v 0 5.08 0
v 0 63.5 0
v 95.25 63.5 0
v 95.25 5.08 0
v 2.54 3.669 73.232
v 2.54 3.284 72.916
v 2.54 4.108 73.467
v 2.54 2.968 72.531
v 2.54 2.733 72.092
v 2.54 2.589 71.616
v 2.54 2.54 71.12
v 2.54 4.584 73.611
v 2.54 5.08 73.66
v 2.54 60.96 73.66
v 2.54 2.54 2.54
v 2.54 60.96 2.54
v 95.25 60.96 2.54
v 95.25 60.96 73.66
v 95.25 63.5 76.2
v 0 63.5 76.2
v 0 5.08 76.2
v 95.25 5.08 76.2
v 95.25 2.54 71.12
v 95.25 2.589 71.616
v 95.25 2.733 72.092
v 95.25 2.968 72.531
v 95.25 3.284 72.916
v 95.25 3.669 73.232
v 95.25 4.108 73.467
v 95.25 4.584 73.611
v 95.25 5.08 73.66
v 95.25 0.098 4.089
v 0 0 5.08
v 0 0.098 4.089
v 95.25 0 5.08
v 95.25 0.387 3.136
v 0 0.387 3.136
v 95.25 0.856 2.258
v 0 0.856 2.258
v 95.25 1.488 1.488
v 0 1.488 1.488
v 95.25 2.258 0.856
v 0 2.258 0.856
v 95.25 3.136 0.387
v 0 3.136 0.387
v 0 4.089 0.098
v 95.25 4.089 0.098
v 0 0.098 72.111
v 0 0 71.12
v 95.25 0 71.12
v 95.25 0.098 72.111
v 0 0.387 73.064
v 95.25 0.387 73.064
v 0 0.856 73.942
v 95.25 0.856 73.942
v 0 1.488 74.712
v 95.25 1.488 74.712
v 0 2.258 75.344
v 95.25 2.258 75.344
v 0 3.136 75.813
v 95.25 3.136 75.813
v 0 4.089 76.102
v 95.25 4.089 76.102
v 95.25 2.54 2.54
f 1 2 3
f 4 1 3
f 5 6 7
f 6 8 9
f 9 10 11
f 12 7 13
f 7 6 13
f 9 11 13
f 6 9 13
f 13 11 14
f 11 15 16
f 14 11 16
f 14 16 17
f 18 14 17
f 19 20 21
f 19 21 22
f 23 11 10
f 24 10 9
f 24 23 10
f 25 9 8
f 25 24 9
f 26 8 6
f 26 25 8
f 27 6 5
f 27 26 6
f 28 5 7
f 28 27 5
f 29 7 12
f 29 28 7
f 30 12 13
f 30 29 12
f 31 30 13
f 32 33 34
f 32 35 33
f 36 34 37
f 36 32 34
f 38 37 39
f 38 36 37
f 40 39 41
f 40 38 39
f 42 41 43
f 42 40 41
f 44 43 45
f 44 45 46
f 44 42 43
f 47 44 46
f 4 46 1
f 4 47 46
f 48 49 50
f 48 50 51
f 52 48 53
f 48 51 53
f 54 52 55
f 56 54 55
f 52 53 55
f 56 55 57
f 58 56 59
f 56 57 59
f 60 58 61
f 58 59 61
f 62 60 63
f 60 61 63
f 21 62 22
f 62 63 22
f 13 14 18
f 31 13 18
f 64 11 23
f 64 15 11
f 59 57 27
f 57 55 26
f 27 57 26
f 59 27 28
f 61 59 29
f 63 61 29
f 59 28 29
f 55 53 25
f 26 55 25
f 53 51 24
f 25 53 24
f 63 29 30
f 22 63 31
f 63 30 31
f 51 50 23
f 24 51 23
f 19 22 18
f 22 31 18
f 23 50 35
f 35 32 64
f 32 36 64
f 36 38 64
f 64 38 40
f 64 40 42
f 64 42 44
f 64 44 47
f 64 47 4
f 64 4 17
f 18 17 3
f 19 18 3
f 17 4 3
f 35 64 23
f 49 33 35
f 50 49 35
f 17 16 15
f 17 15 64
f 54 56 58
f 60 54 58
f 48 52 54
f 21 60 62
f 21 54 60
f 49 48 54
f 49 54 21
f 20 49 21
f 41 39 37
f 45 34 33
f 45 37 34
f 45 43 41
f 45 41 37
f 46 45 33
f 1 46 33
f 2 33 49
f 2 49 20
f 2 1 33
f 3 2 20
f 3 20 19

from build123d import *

# Parameters (mm, degrees)
F0_W     = 95.25
F0_H     = 63.5
F1_DEPTH = 76.2
F2_R     = 5.08
F3_T     = -2.54
F4_R     = 5.08


with BuildPart() as f1:
    # F0 (on Top) → F1 (new body)
    with BuildSketch(Plane.XY):
        with Locations((47.625, 31.75)):
            Rectangle(F0_W, F0_H)
    extrude(amount=F1_DEPTH)

    # F2
    f2_edges = [f1.edges().sort_by_distance(p)[0] for p in [
        (47.625, 0, 76.2),
    ]]
    fillet(f2_edges, radius=F2_R)

    # F3
    f3_openings = [f1.faces().sort_by_distance(p)[0] for p in [
        (95.25, 31.785081, 38.057643),
    ]]
    offset(amount=F3_T, openings=f3_openings)

    # F4
    f4_edges = [f1.edges().sort_by_distance(p)[0] for p in [
        (47.625, 0, 0),
    ]]
    fillet(f4_edges, radius=F4_R)


solid = f1.part
